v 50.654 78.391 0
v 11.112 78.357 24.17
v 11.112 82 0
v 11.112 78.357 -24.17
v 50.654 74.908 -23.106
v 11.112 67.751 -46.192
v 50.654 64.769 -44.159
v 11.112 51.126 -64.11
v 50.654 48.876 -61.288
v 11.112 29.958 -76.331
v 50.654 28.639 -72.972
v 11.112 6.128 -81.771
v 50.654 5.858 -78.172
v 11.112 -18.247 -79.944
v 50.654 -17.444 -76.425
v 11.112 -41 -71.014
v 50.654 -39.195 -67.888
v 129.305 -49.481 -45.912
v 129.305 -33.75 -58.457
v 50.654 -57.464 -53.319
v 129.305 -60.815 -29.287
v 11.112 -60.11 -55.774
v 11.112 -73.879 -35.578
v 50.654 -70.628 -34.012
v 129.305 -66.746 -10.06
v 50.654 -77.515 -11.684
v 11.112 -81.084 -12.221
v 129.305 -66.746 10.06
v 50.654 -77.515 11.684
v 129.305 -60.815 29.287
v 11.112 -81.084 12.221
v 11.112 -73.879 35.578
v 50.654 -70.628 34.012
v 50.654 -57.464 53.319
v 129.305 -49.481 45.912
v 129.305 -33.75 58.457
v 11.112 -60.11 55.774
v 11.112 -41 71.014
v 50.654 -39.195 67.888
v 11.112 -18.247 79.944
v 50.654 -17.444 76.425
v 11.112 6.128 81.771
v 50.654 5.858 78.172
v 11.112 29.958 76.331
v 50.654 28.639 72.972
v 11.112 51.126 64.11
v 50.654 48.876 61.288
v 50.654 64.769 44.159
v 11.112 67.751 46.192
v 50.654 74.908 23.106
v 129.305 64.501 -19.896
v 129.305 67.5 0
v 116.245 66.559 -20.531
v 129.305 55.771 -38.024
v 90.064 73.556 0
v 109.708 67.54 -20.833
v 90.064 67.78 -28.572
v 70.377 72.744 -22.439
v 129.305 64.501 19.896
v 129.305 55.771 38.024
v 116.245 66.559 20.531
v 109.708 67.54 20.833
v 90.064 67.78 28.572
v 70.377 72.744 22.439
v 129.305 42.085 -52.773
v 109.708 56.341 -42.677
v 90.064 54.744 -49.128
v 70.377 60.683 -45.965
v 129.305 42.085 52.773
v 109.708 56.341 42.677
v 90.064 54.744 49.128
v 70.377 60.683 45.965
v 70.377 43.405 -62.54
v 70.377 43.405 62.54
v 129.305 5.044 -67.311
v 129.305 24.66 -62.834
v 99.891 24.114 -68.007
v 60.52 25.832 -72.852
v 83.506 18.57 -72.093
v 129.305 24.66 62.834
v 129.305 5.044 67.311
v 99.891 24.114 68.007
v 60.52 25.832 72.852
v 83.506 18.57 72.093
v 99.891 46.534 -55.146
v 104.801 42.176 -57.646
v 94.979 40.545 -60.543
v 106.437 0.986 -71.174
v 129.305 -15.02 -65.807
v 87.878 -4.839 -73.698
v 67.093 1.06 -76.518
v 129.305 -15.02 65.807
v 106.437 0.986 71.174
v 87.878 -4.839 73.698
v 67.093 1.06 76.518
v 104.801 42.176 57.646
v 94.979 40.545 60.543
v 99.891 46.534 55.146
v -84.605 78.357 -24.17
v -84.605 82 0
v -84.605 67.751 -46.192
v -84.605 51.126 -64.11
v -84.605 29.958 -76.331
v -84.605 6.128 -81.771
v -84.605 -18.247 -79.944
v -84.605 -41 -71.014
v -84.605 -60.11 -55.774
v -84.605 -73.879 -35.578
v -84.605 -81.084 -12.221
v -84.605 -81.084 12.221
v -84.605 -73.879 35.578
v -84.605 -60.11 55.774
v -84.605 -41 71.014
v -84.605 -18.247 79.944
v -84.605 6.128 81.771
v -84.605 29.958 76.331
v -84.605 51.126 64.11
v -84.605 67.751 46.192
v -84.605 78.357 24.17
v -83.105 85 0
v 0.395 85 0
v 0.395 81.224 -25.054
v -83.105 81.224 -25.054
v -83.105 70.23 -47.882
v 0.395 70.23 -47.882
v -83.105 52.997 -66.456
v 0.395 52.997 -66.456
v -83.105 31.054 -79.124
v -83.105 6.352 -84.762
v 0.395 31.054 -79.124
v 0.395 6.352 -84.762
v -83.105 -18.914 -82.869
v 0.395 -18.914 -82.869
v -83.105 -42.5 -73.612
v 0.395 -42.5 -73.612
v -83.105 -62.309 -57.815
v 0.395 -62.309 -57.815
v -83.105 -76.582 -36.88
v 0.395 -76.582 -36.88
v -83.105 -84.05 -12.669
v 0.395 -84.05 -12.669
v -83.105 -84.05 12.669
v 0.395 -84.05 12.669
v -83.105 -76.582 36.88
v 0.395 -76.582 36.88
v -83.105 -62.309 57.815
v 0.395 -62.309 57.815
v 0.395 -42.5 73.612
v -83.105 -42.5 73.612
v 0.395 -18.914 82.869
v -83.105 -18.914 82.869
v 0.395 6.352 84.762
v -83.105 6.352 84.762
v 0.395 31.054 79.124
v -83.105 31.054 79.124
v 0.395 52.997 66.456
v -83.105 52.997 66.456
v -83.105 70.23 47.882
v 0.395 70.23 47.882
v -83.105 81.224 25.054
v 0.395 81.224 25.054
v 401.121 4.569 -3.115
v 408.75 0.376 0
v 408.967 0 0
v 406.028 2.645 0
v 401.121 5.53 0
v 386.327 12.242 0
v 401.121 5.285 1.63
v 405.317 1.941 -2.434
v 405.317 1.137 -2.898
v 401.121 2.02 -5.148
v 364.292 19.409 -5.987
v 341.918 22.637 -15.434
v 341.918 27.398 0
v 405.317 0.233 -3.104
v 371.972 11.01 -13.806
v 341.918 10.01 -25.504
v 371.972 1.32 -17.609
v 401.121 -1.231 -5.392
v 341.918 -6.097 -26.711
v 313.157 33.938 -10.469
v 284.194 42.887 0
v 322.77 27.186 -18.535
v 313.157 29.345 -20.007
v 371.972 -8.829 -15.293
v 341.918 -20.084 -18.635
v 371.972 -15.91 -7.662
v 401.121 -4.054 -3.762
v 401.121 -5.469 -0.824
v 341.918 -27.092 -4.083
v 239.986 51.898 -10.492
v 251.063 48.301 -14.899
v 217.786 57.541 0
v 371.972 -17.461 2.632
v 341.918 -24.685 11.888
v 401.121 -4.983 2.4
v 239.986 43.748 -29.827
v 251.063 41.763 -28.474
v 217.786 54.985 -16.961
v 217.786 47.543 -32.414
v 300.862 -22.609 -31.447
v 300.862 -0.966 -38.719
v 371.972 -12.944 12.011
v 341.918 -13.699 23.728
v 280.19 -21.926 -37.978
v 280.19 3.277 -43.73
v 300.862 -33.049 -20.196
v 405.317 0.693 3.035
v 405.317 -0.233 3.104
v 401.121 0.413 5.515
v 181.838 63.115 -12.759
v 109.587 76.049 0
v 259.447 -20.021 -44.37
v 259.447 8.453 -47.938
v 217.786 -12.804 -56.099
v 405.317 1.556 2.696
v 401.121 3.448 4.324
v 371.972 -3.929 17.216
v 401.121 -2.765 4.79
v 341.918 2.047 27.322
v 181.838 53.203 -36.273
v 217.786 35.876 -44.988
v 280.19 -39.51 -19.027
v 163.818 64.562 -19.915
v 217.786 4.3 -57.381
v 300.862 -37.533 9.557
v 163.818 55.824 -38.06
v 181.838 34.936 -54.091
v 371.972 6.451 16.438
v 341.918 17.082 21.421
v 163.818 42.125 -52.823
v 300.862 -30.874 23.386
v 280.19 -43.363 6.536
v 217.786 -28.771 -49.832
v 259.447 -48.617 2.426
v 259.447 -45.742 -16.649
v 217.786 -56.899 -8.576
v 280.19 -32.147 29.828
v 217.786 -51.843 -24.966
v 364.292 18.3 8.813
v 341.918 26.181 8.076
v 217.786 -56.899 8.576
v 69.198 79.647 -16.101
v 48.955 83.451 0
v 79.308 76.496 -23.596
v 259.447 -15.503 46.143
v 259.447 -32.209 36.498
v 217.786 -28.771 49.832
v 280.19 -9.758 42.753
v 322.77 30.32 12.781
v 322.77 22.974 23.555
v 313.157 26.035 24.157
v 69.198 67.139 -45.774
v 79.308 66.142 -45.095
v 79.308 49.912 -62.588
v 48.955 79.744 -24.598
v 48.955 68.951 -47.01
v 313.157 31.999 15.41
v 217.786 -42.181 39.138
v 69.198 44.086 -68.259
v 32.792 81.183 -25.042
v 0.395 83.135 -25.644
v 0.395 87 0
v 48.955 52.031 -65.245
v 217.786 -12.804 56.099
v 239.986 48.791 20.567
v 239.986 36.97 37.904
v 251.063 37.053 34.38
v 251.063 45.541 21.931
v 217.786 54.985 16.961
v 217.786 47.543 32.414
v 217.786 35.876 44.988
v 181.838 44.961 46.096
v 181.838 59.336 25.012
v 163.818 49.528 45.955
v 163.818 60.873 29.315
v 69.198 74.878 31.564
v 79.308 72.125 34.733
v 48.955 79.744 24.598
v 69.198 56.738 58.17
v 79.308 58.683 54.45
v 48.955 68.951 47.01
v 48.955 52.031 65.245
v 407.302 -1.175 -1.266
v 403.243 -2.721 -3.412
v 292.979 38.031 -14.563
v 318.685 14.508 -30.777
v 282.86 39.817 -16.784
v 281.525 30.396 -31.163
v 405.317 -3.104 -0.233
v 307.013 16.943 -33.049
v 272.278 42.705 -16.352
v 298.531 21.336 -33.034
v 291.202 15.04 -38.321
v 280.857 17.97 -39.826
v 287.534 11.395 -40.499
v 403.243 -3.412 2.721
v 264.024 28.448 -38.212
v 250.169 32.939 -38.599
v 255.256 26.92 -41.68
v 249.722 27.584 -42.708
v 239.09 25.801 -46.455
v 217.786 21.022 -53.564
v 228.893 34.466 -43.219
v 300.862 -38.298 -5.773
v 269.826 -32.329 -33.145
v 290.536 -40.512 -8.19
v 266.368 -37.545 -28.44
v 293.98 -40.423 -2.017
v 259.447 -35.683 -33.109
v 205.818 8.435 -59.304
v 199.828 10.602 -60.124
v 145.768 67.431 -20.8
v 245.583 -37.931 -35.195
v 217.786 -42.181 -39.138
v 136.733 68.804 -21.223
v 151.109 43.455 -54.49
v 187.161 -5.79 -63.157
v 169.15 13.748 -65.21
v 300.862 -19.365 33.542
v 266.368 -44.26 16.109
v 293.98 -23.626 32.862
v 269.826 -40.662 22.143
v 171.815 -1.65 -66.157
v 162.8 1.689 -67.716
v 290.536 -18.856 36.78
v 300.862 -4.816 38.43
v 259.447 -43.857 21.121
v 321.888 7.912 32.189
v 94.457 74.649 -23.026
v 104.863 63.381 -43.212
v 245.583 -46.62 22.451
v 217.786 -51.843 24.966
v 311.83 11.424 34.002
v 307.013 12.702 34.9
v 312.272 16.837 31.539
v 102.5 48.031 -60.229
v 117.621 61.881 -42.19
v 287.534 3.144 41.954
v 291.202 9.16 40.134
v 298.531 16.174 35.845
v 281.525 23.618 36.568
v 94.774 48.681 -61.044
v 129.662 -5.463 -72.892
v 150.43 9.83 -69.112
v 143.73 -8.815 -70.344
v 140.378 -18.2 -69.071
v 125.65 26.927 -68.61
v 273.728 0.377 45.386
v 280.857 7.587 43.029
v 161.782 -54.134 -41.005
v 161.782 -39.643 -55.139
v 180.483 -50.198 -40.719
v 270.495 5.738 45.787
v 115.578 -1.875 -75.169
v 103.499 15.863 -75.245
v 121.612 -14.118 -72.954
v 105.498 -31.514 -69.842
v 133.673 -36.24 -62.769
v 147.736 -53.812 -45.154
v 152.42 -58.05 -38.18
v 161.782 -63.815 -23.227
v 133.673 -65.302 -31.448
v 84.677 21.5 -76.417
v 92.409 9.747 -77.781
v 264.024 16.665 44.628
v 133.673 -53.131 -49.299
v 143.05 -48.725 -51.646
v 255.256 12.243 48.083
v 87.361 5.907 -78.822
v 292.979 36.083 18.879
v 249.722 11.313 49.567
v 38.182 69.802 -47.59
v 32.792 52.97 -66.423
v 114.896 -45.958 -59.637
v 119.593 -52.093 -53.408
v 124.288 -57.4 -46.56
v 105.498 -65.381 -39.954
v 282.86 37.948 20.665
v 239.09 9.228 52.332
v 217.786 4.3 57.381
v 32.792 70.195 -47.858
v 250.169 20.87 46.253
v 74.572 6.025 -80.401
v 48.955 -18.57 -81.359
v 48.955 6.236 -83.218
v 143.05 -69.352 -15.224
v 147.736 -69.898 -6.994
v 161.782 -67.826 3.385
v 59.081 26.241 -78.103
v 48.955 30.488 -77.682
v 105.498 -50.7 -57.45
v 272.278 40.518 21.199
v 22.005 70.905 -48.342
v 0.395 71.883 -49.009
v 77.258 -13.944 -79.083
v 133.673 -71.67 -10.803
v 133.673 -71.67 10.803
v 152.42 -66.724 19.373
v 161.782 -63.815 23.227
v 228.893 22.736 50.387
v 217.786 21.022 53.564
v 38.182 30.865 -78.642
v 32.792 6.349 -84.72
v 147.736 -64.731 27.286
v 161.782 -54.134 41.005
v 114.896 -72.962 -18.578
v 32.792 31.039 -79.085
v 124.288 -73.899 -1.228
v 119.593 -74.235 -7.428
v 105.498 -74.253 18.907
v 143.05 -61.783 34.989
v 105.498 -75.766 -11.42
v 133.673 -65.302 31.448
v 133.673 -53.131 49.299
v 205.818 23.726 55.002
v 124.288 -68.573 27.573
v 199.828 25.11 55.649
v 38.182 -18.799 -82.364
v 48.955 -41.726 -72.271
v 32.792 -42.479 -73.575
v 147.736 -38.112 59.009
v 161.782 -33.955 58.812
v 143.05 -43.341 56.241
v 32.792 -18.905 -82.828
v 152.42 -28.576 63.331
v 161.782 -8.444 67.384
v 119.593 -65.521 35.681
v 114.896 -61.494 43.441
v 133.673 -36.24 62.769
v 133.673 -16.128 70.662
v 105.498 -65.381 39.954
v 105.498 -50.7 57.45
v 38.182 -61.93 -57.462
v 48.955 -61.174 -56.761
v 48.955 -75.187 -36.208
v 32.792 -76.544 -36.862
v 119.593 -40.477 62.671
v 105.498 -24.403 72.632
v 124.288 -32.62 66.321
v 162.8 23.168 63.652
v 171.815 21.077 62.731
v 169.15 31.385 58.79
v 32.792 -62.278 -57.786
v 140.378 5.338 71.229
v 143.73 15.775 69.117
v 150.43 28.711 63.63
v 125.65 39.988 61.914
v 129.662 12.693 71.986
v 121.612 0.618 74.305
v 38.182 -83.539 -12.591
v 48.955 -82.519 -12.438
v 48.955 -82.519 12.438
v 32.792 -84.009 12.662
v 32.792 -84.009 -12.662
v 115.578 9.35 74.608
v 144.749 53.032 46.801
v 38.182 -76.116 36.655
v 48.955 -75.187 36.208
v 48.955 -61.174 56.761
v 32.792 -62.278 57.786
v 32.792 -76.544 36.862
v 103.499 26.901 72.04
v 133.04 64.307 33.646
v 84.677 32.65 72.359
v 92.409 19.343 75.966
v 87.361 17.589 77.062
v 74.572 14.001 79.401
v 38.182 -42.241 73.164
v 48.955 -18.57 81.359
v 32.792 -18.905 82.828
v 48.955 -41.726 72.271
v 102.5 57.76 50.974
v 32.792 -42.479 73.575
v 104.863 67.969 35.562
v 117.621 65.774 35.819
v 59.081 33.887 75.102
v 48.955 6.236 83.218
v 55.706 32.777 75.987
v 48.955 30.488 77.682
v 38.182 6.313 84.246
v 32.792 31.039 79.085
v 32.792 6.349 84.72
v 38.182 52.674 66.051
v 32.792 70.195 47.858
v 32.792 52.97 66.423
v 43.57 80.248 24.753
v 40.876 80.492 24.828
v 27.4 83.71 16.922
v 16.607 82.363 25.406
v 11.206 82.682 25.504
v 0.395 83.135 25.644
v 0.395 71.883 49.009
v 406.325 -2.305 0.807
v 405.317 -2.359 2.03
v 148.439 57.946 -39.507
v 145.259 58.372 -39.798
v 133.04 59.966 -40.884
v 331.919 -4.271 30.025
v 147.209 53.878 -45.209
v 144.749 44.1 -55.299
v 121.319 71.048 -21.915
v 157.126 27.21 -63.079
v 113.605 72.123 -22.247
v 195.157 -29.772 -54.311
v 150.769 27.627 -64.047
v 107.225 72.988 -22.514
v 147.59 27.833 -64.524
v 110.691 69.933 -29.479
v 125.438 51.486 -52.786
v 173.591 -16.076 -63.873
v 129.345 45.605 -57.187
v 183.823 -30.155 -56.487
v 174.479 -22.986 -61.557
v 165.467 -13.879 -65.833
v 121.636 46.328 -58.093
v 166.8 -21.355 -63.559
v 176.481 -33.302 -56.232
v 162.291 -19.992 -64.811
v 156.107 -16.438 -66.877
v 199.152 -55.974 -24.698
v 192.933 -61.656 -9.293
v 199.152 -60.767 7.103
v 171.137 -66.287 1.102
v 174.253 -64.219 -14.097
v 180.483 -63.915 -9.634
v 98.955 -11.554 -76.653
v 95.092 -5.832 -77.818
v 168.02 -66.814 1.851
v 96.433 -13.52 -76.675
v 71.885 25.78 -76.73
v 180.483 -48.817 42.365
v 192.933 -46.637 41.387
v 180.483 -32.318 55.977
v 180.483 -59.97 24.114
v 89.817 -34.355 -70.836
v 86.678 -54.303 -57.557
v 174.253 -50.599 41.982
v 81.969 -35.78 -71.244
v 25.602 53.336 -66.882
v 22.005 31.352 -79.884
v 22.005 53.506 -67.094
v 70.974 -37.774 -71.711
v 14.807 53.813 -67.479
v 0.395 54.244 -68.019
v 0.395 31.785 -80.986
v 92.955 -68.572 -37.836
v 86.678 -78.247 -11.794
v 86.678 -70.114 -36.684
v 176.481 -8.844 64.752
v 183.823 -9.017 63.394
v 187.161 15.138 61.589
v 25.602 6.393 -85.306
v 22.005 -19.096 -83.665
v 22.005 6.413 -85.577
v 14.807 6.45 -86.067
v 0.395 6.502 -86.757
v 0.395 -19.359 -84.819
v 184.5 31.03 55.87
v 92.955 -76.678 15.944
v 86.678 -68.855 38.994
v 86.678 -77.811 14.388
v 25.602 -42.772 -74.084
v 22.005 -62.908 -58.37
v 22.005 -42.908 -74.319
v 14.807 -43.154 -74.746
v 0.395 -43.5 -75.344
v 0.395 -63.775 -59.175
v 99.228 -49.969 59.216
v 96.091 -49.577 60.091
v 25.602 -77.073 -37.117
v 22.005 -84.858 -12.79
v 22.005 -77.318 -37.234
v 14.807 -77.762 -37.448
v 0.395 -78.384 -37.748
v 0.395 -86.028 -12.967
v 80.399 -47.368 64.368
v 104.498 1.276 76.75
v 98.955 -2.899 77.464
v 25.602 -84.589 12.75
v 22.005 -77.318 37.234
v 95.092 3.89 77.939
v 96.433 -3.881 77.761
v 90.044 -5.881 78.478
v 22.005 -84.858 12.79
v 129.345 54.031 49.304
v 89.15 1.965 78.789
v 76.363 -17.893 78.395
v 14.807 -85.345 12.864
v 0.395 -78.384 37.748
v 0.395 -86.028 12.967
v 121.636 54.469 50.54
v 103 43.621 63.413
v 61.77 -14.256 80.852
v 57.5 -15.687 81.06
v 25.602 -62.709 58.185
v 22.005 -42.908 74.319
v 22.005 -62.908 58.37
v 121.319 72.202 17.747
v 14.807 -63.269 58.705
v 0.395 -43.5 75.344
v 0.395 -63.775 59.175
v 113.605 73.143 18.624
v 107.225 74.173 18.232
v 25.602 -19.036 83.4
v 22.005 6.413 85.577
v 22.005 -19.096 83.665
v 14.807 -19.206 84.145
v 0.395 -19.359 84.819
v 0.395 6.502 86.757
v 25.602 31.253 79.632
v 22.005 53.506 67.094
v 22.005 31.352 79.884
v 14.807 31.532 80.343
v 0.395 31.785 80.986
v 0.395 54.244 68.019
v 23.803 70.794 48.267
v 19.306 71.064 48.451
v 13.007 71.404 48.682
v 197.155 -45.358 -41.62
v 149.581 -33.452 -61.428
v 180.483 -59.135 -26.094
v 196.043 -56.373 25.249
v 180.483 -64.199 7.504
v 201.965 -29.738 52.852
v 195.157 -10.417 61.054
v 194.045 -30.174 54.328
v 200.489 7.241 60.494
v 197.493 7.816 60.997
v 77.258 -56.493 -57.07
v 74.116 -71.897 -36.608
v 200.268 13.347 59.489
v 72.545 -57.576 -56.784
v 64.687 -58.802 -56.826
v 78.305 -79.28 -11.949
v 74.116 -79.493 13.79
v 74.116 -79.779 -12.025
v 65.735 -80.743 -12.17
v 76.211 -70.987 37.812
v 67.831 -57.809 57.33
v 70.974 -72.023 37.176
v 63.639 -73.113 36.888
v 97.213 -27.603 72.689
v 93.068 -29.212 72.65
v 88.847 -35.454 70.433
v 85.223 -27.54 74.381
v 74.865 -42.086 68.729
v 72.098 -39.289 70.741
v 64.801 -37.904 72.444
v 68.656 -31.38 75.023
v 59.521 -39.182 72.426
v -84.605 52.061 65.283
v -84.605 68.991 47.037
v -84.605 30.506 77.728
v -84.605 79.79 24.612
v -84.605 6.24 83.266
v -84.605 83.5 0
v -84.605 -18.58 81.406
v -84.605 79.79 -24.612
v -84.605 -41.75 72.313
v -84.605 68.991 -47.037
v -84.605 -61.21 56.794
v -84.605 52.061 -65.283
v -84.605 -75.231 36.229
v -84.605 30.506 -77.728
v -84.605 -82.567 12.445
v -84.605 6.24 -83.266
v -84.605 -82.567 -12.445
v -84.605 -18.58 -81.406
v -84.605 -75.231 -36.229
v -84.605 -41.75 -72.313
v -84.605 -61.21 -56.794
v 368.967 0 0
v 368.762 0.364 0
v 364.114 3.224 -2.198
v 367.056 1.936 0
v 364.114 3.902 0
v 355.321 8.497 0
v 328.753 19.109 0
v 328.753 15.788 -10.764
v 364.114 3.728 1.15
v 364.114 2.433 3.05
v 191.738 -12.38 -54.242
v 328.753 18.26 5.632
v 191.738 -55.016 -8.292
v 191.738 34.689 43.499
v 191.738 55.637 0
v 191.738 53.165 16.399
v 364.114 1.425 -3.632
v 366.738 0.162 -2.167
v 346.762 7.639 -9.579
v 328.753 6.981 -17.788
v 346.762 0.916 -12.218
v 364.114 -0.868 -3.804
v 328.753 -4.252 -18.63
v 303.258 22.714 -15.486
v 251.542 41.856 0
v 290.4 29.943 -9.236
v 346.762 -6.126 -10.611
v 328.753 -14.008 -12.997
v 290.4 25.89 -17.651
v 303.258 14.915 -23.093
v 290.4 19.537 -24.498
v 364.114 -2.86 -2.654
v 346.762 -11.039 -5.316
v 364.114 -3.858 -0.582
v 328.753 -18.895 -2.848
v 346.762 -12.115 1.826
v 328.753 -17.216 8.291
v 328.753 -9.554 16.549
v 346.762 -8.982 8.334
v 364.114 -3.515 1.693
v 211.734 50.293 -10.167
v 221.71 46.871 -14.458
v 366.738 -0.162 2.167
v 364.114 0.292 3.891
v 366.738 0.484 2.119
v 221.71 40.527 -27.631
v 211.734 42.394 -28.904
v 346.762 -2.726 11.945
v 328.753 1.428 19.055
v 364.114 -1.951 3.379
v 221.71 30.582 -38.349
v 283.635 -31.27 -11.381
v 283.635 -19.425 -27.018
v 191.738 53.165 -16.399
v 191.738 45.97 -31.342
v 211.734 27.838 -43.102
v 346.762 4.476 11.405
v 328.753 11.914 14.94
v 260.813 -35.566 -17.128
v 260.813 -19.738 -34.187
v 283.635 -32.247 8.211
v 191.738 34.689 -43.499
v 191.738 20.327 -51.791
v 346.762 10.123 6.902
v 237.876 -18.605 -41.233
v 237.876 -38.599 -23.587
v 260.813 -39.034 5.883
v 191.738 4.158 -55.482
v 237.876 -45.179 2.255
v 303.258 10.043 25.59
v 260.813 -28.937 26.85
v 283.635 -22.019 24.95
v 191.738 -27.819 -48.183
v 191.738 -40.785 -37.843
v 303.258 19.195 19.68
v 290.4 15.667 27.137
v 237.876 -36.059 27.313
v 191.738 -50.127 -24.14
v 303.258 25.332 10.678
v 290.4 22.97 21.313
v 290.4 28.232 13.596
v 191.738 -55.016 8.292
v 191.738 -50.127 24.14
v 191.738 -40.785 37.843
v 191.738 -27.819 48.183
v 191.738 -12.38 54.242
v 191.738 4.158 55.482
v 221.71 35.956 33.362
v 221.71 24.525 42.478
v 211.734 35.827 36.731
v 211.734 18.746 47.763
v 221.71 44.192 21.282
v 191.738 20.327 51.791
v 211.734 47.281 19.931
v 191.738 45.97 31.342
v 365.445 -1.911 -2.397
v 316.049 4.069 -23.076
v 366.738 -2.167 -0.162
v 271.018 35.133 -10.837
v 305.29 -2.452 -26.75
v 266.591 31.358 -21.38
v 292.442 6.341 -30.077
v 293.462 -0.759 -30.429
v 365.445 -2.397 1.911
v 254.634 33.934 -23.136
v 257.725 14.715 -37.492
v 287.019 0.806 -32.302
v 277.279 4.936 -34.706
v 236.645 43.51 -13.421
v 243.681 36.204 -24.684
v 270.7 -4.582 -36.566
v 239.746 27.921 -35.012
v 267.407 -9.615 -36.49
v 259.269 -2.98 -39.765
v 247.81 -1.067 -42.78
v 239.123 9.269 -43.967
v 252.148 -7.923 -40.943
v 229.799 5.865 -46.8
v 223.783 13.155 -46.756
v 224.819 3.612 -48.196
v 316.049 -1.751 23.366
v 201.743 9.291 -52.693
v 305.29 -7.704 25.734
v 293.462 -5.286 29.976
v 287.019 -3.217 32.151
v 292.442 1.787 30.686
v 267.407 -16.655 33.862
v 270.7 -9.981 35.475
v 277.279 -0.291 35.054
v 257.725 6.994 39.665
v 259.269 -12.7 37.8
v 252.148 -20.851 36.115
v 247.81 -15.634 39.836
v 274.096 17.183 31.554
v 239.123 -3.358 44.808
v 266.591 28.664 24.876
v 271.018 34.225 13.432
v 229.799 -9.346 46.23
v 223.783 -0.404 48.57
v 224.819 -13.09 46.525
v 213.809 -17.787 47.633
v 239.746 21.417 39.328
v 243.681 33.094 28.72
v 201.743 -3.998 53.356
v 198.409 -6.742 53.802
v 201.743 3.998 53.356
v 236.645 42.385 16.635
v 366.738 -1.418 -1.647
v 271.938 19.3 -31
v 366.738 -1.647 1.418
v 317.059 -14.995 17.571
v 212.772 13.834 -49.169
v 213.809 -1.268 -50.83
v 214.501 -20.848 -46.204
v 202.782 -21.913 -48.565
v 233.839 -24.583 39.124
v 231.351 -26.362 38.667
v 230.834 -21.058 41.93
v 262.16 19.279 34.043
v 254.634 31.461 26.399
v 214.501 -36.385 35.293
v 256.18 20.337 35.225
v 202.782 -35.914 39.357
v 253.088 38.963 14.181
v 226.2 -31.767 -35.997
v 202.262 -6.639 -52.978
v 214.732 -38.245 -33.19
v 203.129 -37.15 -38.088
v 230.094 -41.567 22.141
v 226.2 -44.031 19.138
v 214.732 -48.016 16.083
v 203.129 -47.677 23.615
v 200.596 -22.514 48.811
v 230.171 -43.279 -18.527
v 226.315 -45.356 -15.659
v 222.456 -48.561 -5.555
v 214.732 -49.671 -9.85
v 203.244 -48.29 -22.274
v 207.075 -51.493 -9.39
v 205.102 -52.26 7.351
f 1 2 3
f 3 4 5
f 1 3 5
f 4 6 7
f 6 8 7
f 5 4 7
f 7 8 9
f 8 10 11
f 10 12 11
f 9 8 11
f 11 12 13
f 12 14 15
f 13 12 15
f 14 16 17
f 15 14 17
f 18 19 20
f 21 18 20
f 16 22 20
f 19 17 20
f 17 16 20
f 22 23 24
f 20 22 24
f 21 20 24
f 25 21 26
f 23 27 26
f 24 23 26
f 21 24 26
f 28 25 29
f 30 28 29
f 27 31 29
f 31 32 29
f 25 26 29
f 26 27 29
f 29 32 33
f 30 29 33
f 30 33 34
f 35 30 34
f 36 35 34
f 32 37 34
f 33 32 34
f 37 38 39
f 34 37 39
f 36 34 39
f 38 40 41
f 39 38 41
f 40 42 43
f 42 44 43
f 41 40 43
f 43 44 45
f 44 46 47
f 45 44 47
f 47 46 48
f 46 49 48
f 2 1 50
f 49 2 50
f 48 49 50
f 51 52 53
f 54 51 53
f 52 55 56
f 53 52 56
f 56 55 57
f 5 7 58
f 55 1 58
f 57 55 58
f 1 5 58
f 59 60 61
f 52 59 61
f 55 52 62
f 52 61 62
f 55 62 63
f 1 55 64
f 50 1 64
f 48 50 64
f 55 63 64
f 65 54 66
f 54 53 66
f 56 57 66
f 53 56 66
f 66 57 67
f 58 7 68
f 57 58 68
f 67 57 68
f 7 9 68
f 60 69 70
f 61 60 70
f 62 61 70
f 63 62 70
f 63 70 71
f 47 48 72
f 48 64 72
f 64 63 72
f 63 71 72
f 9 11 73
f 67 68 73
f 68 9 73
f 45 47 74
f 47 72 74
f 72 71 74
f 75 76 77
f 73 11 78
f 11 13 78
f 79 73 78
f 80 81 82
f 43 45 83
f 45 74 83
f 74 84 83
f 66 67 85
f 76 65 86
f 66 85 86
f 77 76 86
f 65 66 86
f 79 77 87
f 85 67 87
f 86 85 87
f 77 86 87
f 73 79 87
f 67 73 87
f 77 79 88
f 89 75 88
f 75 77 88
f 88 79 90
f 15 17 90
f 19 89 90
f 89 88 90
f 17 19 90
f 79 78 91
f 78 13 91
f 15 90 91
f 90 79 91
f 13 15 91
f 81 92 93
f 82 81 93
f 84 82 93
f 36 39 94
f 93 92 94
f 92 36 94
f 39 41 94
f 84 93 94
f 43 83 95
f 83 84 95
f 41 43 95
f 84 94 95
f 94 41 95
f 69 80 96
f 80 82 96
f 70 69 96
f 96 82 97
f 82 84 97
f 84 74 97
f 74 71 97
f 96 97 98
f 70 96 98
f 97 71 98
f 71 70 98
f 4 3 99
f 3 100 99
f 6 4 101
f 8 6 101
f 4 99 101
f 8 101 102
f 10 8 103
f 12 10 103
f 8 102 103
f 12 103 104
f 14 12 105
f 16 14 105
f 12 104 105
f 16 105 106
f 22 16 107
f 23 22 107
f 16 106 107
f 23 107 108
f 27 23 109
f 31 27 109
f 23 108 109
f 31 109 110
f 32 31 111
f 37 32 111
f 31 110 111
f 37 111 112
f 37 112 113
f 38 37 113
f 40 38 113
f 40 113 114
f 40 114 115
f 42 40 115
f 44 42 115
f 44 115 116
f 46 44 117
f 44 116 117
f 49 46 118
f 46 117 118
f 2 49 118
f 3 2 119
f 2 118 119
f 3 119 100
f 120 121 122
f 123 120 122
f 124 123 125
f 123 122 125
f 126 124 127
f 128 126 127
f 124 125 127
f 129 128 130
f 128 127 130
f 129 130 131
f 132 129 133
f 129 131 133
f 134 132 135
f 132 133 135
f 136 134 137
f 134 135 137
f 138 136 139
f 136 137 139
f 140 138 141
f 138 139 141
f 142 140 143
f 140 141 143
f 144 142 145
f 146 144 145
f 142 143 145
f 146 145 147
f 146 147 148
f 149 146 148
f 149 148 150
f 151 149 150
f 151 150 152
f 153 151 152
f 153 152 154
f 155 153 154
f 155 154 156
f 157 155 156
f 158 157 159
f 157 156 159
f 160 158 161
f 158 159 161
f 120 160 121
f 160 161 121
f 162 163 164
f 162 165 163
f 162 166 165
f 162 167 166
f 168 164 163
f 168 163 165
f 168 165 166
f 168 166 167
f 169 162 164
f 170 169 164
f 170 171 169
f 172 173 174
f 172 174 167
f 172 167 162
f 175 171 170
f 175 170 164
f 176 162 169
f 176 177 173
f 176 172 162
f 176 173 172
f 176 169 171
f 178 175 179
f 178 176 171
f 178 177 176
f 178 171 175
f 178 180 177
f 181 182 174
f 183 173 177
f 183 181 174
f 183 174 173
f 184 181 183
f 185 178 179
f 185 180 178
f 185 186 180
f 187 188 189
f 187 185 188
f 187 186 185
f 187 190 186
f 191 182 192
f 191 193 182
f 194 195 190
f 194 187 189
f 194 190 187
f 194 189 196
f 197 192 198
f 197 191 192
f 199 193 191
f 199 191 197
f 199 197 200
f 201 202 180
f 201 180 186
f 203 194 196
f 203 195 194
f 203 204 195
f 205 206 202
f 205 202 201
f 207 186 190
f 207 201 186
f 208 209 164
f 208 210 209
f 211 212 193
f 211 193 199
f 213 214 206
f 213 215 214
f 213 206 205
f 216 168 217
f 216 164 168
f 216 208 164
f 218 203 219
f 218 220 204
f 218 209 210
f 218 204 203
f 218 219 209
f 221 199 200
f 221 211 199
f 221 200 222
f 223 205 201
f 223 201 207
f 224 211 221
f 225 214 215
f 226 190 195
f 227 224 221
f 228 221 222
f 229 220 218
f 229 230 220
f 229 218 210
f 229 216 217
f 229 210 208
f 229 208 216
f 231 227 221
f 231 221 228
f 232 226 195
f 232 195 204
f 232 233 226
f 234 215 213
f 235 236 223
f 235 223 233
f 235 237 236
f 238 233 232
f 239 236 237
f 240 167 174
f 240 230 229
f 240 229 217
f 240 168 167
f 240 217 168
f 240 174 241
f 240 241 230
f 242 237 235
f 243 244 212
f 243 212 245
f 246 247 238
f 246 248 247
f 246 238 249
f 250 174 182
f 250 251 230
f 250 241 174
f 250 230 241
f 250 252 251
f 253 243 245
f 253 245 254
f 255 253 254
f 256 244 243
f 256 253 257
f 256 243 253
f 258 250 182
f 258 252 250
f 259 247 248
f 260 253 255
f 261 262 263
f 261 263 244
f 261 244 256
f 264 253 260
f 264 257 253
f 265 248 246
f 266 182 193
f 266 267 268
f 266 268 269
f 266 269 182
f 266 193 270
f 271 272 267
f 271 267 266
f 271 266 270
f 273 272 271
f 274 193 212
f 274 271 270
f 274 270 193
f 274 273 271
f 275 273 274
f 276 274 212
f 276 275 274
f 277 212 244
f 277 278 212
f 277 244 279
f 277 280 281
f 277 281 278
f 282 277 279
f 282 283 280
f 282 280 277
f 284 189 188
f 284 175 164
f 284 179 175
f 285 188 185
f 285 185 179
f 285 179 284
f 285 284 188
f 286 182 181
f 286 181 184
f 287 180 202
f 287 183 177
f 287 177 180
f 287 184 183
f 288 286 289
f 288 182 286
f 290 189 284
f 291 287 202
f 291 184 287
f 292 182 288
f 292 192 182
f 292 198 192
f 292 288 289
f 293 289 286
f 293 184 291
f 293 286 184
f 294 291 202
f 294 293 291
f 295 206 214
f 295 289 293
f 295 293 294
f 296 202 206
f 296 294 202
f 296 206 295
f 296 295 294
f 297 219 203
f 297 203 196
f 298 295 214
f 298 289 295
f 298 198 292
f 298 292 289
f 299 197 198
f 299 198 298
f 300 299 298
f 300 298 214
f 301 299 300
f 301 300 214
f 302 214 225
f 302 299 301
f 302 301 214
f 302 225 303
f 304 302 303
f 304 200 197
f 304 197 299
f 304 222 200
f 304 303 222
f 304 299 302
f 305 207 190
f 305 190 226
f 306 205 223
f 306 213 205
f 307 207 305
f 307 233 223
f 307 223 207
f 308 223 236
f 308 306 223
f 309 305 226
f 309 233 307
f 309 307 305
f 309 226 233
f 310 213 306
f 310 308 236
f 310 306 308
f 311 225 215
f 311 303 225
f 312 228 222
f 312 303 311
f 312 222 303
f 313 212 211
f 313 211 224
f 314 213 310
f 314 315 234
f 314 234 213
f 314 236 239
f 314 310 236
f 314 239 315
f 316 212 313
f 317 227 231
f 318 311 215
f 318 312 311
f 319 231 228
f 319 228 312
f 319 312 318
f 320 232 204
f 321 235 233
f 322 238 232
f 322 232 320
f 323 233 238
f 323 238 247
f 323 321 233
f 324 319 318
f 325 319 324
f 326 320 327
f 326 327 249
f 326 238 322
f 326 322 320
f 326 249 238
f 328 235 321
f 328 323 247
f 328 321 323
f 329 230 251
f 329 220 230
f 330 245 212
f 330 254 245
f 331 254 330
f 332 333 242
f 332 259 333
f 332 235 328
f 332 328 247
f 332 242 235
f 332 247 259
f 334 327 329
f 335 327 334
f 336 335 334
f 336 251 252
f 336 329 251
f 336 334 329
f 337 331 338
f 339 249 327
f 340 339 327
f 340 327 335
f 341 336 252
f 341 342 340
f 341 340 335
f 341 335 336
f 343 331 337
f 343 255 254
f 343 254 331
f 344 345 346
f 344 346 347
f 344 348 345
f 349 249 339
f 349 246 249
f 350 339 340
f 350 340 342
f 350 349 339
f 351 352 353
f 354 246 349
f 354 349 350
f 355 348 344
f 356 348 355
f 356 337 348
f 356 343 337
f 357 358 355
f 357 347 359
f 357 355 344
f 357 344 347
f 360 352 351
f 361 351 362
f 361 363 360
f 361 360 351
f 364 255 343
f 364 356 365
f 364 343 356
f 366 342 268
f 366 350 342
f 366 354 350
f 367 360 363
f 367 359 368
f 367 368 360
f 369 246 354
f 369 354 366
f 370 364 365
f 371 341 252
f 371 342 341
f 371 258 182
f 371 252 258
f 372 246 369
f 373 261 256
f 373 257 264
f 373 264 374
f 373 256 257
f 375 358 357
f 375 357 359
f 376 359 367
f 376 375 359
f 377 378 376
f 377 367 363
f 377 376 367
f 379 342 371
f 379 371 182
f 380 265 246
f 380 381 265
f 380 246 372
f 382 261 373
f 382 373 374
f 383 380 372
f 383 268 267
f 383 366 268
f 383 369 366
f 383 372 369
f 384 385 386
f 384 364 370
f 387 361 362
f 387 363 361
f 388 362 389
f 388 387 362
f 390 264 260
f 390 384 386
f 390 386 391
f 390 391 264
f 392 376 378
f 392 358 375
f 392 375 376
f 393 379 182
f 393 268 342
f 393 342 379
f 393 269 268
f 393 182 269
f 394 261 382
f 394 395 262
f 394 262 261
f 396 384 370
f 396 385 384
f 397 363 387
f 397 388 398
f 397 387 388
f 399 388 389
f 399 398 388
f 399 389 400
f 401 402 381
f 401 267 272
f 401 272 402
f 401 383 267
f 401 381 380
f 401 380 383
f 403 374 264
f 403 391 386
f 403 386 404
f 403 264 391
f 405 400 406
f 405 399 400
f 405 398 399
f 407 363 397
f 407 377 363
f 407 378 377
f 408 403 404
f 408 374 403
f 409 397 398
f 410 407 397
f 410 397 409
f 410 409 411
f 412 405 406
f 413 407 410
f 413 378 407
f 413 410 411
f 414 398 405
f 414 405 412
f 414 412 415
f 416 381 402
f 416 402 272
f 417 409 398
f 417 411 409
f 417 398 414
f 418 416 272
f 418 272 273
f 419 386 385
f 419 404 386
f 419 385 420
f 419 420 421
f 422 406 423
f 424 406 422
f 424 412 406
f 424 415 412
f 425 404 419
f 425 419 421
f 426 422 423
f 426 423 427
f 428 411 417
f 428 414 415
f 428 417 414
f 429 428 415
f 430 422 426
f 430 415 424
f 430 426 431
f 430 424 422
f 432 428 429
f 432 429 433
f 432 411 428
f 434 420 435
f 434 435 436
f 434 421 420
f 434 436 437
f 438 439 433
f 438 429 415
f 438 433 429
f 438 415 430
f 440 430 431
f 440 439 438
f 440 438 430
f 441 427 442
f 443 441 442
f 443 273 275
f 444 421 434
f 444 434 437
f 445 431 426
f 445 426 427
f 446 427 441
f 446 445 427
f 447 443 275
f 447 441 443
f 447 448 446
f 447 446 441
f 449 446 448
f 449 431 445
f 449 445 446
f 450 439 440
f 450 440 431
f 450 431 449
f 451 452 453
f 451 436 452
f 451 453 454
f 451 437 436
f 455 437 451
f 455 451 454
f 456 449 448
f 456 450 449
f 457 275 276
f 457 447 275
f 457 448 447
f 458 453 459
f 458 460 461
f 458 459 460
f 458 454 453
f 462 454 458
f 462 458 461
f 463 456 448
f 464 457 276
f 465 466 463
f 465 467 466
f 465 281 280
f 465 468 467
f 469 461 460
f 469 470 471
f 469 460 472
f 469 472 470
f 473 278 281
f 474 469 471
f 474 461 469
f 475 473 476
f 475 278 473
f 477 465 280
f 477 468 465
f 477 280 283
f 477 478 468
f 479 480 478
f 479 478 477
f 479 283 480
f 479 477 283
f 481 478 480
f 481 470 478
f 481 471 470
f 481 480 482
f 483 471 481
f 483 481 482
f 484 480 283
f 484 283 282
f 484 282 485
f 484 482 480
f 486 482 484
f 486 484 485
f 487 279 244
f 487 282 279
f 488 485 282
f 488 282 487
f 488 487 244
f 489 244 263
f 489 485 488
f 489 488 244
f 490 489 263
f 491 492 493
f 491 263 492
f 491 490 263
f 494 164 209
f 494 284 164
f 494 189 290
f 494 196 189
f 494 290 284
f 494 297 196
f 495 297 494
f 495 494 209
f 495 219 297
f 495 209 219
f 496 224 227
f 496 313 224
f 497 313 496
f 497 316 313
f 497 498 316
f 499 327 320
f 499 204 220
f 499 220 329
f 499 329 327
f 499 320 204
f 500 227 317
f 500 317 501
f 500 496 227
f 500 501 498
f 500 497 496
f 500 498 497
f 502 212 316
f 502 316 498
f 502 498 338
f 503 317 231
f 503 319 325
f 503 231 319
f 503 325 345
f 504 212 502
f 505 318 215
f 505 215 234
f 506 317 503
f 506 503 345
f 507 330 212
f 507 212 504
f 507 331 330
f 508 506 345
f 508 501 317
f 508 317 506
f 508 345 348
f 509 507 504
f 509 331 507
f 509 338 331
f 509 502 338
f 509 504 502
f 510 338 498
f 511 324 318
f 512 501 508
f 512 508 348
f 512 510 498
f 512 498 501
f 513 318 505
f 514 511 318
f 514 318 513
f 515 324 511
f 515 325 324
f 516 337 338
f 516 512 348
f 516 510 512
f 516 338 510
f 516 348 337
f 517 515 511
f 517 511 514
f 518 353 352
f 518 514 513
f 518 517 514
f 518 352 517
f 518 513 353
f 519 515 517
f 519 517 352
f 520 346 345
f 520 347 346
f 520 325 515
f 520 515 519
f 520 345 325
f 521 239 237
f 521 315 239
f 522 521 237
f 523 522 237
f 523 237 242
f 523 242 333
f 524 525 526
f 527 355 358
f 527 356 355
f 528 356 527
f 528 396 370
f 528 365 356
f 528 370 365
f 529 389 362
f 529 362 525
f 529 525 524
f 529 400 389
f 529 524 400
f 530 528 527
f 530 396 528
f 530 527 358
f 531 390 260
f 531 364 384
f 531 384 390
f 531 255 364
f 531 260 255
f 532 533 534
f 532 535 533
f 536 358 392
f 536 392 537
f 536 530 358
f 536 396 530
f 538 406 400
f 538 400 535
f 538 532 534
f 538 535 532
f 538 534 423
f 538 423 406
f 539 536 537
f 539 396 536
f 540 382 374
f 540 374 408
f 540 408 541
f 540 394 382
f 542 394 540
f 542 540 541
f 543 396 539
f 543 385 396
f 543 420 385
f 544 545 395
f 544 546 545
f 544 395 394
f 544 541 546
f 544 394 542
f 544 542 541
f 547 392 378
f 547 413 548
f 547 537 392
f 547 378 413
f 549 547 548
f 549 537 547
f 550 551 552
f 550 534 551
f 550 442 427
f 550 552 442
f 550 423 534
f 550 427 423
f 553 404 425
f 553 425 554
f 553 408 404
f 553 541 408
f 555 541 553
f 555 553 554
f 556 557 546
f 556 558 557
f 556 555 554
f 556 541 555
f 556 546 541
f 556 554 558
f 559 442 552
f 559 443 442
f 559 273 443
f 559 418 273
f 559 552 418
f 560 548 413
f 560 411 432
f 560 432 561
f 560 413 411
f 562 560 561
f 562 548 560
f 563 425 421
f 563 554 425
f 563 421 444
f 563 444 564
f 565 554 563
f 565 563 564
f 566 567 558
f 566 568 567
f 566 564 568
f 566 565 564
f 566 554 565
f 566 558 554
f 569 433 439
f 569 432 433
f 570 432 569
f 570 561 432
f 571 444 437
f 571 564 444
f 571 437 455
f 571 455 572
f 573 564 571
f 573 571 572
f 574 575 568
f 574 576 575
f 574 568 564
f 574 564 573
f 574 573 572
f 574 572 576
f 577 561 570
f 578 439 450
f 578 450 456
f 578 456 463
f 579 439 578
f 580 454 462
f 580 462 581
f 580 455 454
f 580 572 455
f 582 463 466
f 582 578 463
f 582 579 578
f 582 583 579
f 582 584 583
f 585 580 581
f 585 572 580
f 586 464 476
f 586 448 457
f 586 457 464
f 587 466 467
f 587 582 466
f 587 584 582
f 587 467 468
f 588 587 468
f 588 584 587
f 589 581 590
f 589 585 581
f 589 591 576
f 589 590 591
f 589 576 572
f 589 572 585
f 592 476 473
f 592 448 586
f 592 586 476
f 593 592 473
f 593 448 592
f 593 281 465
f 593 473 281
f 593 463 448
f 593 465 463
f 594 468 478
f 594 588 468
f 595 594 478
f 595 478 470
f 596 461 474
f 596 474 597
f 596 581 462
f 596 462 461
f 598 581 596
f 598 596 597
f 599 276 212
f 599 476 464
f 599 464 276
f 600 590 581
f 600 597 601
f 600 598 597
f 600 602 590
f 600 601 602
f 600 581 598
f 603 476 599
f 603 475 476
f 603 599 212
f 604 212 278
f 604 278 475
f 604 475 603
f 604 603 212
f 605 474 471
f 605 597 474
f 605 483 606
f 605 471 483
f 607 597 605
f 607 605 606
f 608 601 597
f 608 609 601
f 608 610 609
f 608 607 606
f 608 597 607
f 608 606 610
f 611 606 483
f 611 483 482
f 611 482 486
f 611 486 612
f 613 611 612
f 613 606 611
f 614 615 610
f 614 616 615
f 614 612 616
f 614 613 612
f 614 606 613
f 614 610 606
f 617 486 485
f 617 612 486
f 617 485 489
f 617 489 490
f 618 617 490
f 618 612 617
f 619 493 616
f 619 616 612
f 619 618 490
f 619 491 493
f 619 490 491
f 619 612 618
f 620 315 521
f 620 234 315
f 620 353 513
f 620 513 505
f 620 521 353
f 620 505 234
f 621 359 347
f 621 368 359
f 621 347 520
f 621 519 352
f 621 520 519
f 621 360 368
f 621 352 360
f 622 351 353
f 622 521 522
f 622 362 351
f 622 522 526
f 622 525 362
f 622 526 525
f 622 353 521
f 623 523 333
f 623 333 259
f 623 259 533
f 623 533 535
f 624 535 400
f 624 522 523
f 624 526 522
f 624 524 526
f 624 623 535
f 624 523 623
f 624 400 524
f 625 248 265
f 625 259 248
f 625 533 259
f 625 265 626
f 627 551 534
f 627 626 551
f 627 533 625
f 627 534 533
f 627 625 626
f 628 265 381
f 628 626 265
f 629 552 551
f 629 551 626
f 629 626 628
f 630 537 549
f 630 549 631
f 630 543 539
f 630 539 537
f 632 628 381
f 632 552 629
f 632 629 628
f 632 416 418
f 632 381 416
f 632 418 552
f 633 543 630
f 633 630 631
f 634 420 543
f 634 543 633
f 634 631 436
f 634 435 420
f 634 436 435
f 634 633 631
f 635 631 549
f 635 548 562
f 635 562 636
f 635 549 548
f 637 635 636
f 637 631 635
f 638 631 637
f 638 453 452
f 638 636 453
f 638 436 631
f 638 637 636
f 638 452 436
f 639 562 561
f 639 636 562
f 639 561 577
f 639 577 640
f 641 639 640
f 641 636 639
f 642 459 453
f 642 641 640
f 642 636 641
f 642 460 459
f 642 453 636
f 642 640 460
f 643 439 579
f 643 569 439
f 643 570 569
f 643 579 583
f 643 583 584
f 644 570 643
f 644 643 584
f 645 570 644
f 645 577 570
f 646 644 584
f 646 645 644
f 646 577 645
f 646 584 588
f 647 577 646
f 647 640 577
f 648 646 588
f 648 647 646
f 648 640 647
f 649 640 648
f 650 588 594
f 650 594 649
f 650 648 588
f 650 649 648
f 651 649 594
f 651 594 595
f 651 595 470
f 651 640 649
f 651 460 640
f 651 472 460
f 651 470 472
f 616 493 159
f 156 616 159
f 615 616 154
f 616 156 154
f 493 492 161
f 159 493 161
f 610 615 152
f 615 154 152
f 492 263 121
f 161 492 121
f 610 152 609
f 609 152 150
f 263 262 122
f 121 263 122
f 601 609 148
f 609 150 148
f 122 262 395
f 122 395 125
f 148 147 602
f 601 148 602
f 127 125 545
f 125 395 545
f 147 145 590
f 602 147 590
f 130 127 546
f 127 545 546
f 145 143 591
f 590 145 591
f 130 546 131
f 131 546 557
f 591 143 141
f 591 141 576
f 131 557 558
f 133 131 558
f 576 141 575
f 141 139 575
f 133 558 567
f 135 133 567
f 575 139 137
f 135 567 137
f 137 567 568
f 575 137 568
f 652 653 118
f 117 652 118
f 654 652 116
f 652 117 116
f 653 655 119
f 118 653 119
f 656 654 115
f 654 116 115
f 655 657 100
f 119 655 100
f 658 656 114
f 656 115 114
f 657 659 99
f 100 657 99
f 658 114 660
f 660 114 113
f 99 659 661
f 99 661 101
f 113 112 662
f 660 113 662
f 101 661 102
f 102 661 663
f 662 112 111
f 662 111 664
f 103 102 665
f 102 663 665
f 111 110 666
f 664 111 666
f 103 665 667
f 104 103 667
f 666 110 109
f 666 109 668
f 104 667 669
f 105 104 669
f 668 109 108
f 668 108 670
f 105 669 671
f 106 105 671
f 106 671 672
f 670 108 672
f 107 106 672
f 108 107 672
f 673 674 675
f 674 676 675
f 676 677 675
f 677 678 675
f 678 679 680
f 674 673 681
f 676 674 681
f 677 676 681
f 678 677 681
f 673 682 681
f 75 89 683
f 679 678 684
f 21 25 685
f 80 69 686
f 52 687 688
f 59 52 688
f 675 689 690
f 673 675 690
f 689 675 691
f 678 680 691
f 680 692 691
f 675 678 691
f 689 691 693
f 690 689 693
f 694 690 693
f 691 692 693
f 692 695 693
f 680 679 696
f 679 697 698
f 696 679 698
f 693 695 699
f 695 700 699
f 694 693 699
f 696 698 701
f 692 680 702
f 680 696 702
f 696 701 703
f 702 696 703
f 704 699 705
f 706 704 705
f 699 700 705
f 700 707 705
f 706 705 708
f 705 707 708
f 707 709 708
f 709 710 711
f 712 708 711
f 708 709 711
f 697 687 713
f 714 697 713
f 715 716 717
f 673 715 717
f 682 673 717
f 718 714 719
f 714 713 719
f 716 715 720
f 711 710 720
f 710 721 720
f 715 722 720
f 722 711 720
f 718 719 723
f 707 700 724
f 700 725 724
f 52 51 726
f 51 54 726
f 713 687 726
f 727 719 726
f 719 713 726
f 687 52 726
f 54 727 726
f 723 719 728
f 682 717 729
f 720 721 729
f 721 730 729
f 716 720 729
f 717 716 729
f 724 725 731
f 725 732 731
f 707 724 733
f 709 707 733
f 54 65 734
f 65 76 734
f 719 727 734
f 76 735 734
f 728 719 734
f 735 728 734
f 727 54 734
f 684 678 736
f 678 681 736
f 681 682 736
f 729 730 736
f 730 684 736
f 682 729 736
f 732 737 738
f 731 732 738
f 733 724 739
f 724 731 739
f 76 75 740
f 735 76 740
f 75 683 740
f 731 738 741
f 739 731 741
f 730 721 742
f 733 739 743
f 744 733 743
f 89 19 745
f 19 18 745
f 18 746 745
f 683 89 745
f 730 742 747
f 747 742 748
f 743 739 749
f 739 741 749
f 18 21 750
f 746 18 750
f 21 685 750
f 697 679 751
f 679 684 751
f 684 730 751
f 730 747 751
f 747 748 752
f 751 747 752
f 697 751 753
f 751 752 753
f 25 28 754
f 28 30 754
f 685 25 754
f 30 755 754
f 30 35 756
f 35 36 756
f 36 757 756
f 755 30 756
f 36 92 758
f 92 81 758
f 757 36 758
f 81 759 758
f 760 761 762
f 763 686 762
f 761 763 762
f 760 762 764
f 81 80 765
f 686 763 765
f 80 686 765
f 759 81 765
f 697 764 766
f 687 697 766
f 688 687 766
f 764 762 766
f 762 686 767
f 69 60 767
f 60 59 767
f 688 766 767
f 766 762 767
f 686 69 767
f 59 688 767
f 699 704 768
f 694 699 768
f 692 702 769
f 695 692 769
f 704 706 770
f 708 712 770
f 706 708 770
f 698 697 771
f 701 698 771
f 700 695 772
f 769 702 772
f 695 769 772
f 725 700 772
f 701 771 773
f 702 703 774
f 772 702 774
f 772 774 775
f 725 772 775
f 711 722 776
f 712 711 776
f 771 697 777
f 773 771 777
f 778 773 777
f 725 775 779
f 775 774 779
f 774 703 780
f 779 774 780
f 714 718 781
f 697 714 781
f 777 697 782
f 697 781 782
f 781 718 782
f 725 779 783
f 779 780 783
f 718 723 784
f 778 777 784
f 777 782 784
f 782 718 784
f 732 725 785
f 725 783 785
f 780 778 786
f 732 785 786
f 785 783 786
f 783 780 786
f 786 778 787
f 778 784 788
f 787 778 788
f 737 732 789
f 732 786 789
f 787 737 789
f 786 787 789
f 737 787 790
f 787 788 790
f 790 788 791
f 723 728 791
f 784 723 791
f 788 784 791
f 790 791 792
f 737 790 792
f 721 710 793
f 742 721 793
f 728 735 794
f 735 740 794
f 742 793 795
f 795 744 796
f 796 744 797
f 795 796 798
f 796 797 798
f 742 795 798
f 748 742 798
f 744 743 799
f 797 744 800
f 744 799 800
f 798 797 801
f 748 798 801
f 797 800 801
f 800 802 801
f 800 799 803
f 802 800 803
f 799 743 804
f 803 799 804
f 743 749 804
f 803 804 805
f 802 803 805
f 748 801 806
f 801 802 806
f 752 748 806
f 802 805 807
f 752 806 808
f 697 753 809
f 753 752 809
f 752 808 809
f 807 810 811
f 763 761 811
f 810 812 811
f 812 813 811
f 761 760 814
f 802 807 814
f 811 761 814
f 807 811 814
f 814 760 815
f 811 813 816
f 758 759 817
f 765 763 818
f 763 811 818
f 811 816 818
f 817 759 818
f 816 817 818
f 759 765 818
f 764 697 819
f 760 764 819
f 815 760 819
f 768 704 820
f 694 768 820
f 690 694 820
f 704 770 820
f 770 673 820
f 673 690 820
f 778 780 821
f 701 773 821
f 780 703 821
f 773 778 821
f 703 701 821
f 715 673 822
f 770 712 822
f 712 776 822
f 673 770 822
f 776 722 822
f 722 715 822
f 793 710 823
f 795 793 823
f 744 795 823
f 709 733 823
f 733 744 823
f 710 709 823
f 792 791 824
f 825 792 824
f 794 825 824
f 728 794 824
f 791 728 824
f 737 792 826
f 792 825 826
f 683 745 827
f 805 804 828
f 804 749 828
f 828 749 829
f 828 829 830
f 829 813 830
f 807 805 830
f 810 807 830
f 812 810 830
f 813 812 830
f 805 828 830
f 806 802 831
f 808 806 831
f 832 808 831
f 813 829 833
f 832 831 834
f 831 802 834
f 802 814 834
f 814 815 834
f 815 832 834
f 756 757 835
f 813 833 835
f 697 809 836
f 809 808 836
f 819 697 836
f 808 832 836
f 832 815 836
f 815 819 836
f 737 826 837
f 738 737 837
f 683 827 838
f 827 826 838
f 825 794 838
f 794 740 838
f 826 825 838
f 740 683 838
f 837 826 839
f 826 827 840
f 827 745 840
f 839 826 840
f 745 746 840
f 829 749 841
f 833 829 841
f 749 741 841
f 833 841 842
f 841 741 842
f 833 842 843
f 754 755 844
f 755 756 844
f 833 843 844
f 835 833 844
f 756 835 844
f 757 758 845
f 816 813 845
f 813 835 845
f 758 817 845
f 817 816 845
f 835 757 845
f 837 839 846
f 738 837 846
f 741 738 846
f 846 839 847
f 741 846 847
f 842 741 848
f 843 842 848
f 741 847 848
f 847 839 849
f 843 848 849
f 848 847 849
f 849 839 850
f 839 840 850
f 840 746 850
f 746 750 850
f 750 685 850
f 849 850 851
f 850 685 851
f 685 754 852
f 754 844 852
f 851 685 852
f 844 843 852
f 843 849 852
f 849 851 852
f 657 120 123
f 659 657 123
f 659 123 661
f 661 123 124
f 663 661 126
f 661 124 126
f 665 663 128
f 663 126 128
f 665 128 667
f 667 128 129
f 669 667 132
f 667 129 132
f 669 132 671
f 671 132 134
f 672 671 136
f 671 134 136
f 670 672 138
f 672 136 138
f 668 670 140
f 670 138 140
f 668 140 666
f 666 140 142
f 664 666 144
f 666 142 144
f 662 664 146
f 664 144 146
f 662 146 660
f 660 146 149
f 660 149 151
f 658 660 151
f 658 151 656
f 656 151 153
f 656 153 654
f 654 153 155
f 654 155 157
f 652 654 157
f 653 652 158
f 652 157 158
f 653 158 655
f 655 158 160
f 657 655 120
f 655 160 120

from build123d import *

# Parameters (mm, degrees)
CHAMFER1_SIZE = 1.5


with BuildPart() as part:
    # Sketch10 → Revolve1 (revolve)
    with BuildSketch(Plane.XY):
        with BuildLine():
            Line((11.112493743, 81.99983), (-84.604517473, 81.99983))
            Line((-84.604517473, 81.99983), (-84.604517473, 84.99983))
            Line((-84.604517473, 84.99983), (0.395312527, 84.99983))
            Line((0.395312527, 84.99983), (0.395312527, 86.99983))
            add(Edge.make_bspline(
                [(408.967251823, 0), (408.964913524, 0.013501739), (408.958040758, 0.039916077), (408.936520441, 0.090485698), (408.892222076, 0.174057132), (408.826281575, 0.275556803), (408.721696416, 0.415833756), (408.561101809, 0.605075245), (408.30561918, 0.87242415), (407.86966713, 1.275299562), (407.120955138, 1.885142115), (405.803773451, 2.82590185), (403.46240692, 4.287152794), (399.325294488, 6.531818454), (392.481146888, 9.758904649), (380.662076725, 14.628008466), (363.637187185, 20.711720382), (342.215241093, 27.476512989), (317.428462321, 34.49762647), (291.879335737, 41.10482439), (266.21046092, 47.228993169), (240.44548836, 52.933436777), (214.598861982, 58.255439009), (188.68089566, 63.217582693), (165.946174917, 67.253280679), (146.421982586, 70.493799722), (130.127893898, 73.044947468), (117.078590637, 74.994157933), (104.015464216, 76.84854079), (92.573263959, 78.384492045), (82.757139441, 79.635603973), (74.571340184, 80.632219902), (68.019260454, 81.400804211), (61.463723364, 82.139375899), (54.90469802, 82.84637726), (48.342159918, 83.519940506), (41.776057559, 84.15778717), (36.02754108, 84.682157239), (31.097921259, 85.105234912), (26.988317923, 85.438669825), (23.699666618, 85.693218594), (20.085807822, 85.958448038), (16.719873821, 86.189018485), (13.602098287, 86.386966779), (10.732704013, 86.554575744), (8.436635008, 86.678703291), (6.139997341, 86.792157585), (4.129892063, 86.879313264), (2.40653858, 86.944618982), (1.257348635, 86.979022496), (0.68269791, 86.99491462), (0.395312527, 86.99983)],
                knots=[0, 0, 0, 0, 0, 0.000130123, 0.000260245, 0.000520491, 0.000900391, 0.00128029, 0.001925099, 0.002881508, 0.004418208, 0.006927086, 0.011110697, 0.018279138, 0.03067276, 0.051704469, 0.08310228, 0.139908797, 0.202702513, 0.265496165, 0.328289682, 0.391083359, 0.453876973, 0.516670577, 0.579464197, 0.642257765, 0.673654596, 0.705051427, 0.736448267, 0.767845106, 0.799241874, 0.814940257, 0.830638641, 0.846337073, 0.862035505, 0.877733936, 0.893432368, 0.90913072, 0.924829072, 0.932678248, 0.940527424, 0.9483766, 0.956225776, 0.967169332, 0.97264111, 0.978112888, 0.983584666, 0.989056444, 0.994528222, 0.997264111, 1, 1, 1, 1, 1], degree=4))
            Line((408.967251823, 0), (368.967251823, 0))
            add(Edge.make_bspline(
                [(368.967251823, 0), (368.965299543, 0.012338489), (368.959416882, 0.036518378), (368.940636147, 0.082964007), (368.902304552, 0.158736421), (368.845538097, 0.250270687), (368.755690124, 0.376555746), (368.616653262, 0.54835284), (368.392888737, 0.793577299), (368.008659121, 1.164904965), (367.344738263, 1.729853685), (366.176060796, 2.601559154), (364.09282389, 3.960032328), (360.425978756, 6.040734396), (354.402196649, 9.01831007), (344.042994901, 13.507695011), (329.152005398, 19.128483965), (310.425167902, 25.398569259), (288.741266406, 31.933693508), (266.378532845, 38.106125474), (243.901379123, 43.846895186), (221.331994001, 49.212017941), (198.683967629, 54.234500927), (175.966897581, 58.934255644), (156.034567874, 62.771715365), (141.509051931, 65.395628269), (132.679425236, 66.924517444), (129.562757303, 67.455859883), (129.304508698, 67.49983)],
                knots=[0, 0, 0, 0, 0, 0.000134949, 0.000269899, 0.000539798, 0.000919537, 0.001299277, 0.001947431, 0.00293136, 0.004511869, 0.007081312, 0.011380263, 0.018707867, 0.031423867, 0.052705479, 0.084103008, 0.140910136, 0.203703492, 0.266497064, 0.329290816, 0.392084375, 0.454877964, 0.517671564, 0.580465191, 0.643258828, 0.674655593, 0.677492072, 0.677492072, 0.677492072, 0.677492072, 0.677492072], degree=4))
            ThreePointArc((129.304508698, 67.49983), (70.377361693, 76.126240996), (11.112493743, 81.99983))
        make_face()
    revolve(axis=Axis((46.917858469, 0, 0), (-1, 0, 0)))

    # Chamfer1
    chamfer1_edges = [part.edges().sort_by_distance(p)[0] for p in [
        (-84.604517473, -84.99983, 0),
    ]]
    chamfer(chamfer1_edges, length=CHAMFER1_SIZE)


solid = part.part
